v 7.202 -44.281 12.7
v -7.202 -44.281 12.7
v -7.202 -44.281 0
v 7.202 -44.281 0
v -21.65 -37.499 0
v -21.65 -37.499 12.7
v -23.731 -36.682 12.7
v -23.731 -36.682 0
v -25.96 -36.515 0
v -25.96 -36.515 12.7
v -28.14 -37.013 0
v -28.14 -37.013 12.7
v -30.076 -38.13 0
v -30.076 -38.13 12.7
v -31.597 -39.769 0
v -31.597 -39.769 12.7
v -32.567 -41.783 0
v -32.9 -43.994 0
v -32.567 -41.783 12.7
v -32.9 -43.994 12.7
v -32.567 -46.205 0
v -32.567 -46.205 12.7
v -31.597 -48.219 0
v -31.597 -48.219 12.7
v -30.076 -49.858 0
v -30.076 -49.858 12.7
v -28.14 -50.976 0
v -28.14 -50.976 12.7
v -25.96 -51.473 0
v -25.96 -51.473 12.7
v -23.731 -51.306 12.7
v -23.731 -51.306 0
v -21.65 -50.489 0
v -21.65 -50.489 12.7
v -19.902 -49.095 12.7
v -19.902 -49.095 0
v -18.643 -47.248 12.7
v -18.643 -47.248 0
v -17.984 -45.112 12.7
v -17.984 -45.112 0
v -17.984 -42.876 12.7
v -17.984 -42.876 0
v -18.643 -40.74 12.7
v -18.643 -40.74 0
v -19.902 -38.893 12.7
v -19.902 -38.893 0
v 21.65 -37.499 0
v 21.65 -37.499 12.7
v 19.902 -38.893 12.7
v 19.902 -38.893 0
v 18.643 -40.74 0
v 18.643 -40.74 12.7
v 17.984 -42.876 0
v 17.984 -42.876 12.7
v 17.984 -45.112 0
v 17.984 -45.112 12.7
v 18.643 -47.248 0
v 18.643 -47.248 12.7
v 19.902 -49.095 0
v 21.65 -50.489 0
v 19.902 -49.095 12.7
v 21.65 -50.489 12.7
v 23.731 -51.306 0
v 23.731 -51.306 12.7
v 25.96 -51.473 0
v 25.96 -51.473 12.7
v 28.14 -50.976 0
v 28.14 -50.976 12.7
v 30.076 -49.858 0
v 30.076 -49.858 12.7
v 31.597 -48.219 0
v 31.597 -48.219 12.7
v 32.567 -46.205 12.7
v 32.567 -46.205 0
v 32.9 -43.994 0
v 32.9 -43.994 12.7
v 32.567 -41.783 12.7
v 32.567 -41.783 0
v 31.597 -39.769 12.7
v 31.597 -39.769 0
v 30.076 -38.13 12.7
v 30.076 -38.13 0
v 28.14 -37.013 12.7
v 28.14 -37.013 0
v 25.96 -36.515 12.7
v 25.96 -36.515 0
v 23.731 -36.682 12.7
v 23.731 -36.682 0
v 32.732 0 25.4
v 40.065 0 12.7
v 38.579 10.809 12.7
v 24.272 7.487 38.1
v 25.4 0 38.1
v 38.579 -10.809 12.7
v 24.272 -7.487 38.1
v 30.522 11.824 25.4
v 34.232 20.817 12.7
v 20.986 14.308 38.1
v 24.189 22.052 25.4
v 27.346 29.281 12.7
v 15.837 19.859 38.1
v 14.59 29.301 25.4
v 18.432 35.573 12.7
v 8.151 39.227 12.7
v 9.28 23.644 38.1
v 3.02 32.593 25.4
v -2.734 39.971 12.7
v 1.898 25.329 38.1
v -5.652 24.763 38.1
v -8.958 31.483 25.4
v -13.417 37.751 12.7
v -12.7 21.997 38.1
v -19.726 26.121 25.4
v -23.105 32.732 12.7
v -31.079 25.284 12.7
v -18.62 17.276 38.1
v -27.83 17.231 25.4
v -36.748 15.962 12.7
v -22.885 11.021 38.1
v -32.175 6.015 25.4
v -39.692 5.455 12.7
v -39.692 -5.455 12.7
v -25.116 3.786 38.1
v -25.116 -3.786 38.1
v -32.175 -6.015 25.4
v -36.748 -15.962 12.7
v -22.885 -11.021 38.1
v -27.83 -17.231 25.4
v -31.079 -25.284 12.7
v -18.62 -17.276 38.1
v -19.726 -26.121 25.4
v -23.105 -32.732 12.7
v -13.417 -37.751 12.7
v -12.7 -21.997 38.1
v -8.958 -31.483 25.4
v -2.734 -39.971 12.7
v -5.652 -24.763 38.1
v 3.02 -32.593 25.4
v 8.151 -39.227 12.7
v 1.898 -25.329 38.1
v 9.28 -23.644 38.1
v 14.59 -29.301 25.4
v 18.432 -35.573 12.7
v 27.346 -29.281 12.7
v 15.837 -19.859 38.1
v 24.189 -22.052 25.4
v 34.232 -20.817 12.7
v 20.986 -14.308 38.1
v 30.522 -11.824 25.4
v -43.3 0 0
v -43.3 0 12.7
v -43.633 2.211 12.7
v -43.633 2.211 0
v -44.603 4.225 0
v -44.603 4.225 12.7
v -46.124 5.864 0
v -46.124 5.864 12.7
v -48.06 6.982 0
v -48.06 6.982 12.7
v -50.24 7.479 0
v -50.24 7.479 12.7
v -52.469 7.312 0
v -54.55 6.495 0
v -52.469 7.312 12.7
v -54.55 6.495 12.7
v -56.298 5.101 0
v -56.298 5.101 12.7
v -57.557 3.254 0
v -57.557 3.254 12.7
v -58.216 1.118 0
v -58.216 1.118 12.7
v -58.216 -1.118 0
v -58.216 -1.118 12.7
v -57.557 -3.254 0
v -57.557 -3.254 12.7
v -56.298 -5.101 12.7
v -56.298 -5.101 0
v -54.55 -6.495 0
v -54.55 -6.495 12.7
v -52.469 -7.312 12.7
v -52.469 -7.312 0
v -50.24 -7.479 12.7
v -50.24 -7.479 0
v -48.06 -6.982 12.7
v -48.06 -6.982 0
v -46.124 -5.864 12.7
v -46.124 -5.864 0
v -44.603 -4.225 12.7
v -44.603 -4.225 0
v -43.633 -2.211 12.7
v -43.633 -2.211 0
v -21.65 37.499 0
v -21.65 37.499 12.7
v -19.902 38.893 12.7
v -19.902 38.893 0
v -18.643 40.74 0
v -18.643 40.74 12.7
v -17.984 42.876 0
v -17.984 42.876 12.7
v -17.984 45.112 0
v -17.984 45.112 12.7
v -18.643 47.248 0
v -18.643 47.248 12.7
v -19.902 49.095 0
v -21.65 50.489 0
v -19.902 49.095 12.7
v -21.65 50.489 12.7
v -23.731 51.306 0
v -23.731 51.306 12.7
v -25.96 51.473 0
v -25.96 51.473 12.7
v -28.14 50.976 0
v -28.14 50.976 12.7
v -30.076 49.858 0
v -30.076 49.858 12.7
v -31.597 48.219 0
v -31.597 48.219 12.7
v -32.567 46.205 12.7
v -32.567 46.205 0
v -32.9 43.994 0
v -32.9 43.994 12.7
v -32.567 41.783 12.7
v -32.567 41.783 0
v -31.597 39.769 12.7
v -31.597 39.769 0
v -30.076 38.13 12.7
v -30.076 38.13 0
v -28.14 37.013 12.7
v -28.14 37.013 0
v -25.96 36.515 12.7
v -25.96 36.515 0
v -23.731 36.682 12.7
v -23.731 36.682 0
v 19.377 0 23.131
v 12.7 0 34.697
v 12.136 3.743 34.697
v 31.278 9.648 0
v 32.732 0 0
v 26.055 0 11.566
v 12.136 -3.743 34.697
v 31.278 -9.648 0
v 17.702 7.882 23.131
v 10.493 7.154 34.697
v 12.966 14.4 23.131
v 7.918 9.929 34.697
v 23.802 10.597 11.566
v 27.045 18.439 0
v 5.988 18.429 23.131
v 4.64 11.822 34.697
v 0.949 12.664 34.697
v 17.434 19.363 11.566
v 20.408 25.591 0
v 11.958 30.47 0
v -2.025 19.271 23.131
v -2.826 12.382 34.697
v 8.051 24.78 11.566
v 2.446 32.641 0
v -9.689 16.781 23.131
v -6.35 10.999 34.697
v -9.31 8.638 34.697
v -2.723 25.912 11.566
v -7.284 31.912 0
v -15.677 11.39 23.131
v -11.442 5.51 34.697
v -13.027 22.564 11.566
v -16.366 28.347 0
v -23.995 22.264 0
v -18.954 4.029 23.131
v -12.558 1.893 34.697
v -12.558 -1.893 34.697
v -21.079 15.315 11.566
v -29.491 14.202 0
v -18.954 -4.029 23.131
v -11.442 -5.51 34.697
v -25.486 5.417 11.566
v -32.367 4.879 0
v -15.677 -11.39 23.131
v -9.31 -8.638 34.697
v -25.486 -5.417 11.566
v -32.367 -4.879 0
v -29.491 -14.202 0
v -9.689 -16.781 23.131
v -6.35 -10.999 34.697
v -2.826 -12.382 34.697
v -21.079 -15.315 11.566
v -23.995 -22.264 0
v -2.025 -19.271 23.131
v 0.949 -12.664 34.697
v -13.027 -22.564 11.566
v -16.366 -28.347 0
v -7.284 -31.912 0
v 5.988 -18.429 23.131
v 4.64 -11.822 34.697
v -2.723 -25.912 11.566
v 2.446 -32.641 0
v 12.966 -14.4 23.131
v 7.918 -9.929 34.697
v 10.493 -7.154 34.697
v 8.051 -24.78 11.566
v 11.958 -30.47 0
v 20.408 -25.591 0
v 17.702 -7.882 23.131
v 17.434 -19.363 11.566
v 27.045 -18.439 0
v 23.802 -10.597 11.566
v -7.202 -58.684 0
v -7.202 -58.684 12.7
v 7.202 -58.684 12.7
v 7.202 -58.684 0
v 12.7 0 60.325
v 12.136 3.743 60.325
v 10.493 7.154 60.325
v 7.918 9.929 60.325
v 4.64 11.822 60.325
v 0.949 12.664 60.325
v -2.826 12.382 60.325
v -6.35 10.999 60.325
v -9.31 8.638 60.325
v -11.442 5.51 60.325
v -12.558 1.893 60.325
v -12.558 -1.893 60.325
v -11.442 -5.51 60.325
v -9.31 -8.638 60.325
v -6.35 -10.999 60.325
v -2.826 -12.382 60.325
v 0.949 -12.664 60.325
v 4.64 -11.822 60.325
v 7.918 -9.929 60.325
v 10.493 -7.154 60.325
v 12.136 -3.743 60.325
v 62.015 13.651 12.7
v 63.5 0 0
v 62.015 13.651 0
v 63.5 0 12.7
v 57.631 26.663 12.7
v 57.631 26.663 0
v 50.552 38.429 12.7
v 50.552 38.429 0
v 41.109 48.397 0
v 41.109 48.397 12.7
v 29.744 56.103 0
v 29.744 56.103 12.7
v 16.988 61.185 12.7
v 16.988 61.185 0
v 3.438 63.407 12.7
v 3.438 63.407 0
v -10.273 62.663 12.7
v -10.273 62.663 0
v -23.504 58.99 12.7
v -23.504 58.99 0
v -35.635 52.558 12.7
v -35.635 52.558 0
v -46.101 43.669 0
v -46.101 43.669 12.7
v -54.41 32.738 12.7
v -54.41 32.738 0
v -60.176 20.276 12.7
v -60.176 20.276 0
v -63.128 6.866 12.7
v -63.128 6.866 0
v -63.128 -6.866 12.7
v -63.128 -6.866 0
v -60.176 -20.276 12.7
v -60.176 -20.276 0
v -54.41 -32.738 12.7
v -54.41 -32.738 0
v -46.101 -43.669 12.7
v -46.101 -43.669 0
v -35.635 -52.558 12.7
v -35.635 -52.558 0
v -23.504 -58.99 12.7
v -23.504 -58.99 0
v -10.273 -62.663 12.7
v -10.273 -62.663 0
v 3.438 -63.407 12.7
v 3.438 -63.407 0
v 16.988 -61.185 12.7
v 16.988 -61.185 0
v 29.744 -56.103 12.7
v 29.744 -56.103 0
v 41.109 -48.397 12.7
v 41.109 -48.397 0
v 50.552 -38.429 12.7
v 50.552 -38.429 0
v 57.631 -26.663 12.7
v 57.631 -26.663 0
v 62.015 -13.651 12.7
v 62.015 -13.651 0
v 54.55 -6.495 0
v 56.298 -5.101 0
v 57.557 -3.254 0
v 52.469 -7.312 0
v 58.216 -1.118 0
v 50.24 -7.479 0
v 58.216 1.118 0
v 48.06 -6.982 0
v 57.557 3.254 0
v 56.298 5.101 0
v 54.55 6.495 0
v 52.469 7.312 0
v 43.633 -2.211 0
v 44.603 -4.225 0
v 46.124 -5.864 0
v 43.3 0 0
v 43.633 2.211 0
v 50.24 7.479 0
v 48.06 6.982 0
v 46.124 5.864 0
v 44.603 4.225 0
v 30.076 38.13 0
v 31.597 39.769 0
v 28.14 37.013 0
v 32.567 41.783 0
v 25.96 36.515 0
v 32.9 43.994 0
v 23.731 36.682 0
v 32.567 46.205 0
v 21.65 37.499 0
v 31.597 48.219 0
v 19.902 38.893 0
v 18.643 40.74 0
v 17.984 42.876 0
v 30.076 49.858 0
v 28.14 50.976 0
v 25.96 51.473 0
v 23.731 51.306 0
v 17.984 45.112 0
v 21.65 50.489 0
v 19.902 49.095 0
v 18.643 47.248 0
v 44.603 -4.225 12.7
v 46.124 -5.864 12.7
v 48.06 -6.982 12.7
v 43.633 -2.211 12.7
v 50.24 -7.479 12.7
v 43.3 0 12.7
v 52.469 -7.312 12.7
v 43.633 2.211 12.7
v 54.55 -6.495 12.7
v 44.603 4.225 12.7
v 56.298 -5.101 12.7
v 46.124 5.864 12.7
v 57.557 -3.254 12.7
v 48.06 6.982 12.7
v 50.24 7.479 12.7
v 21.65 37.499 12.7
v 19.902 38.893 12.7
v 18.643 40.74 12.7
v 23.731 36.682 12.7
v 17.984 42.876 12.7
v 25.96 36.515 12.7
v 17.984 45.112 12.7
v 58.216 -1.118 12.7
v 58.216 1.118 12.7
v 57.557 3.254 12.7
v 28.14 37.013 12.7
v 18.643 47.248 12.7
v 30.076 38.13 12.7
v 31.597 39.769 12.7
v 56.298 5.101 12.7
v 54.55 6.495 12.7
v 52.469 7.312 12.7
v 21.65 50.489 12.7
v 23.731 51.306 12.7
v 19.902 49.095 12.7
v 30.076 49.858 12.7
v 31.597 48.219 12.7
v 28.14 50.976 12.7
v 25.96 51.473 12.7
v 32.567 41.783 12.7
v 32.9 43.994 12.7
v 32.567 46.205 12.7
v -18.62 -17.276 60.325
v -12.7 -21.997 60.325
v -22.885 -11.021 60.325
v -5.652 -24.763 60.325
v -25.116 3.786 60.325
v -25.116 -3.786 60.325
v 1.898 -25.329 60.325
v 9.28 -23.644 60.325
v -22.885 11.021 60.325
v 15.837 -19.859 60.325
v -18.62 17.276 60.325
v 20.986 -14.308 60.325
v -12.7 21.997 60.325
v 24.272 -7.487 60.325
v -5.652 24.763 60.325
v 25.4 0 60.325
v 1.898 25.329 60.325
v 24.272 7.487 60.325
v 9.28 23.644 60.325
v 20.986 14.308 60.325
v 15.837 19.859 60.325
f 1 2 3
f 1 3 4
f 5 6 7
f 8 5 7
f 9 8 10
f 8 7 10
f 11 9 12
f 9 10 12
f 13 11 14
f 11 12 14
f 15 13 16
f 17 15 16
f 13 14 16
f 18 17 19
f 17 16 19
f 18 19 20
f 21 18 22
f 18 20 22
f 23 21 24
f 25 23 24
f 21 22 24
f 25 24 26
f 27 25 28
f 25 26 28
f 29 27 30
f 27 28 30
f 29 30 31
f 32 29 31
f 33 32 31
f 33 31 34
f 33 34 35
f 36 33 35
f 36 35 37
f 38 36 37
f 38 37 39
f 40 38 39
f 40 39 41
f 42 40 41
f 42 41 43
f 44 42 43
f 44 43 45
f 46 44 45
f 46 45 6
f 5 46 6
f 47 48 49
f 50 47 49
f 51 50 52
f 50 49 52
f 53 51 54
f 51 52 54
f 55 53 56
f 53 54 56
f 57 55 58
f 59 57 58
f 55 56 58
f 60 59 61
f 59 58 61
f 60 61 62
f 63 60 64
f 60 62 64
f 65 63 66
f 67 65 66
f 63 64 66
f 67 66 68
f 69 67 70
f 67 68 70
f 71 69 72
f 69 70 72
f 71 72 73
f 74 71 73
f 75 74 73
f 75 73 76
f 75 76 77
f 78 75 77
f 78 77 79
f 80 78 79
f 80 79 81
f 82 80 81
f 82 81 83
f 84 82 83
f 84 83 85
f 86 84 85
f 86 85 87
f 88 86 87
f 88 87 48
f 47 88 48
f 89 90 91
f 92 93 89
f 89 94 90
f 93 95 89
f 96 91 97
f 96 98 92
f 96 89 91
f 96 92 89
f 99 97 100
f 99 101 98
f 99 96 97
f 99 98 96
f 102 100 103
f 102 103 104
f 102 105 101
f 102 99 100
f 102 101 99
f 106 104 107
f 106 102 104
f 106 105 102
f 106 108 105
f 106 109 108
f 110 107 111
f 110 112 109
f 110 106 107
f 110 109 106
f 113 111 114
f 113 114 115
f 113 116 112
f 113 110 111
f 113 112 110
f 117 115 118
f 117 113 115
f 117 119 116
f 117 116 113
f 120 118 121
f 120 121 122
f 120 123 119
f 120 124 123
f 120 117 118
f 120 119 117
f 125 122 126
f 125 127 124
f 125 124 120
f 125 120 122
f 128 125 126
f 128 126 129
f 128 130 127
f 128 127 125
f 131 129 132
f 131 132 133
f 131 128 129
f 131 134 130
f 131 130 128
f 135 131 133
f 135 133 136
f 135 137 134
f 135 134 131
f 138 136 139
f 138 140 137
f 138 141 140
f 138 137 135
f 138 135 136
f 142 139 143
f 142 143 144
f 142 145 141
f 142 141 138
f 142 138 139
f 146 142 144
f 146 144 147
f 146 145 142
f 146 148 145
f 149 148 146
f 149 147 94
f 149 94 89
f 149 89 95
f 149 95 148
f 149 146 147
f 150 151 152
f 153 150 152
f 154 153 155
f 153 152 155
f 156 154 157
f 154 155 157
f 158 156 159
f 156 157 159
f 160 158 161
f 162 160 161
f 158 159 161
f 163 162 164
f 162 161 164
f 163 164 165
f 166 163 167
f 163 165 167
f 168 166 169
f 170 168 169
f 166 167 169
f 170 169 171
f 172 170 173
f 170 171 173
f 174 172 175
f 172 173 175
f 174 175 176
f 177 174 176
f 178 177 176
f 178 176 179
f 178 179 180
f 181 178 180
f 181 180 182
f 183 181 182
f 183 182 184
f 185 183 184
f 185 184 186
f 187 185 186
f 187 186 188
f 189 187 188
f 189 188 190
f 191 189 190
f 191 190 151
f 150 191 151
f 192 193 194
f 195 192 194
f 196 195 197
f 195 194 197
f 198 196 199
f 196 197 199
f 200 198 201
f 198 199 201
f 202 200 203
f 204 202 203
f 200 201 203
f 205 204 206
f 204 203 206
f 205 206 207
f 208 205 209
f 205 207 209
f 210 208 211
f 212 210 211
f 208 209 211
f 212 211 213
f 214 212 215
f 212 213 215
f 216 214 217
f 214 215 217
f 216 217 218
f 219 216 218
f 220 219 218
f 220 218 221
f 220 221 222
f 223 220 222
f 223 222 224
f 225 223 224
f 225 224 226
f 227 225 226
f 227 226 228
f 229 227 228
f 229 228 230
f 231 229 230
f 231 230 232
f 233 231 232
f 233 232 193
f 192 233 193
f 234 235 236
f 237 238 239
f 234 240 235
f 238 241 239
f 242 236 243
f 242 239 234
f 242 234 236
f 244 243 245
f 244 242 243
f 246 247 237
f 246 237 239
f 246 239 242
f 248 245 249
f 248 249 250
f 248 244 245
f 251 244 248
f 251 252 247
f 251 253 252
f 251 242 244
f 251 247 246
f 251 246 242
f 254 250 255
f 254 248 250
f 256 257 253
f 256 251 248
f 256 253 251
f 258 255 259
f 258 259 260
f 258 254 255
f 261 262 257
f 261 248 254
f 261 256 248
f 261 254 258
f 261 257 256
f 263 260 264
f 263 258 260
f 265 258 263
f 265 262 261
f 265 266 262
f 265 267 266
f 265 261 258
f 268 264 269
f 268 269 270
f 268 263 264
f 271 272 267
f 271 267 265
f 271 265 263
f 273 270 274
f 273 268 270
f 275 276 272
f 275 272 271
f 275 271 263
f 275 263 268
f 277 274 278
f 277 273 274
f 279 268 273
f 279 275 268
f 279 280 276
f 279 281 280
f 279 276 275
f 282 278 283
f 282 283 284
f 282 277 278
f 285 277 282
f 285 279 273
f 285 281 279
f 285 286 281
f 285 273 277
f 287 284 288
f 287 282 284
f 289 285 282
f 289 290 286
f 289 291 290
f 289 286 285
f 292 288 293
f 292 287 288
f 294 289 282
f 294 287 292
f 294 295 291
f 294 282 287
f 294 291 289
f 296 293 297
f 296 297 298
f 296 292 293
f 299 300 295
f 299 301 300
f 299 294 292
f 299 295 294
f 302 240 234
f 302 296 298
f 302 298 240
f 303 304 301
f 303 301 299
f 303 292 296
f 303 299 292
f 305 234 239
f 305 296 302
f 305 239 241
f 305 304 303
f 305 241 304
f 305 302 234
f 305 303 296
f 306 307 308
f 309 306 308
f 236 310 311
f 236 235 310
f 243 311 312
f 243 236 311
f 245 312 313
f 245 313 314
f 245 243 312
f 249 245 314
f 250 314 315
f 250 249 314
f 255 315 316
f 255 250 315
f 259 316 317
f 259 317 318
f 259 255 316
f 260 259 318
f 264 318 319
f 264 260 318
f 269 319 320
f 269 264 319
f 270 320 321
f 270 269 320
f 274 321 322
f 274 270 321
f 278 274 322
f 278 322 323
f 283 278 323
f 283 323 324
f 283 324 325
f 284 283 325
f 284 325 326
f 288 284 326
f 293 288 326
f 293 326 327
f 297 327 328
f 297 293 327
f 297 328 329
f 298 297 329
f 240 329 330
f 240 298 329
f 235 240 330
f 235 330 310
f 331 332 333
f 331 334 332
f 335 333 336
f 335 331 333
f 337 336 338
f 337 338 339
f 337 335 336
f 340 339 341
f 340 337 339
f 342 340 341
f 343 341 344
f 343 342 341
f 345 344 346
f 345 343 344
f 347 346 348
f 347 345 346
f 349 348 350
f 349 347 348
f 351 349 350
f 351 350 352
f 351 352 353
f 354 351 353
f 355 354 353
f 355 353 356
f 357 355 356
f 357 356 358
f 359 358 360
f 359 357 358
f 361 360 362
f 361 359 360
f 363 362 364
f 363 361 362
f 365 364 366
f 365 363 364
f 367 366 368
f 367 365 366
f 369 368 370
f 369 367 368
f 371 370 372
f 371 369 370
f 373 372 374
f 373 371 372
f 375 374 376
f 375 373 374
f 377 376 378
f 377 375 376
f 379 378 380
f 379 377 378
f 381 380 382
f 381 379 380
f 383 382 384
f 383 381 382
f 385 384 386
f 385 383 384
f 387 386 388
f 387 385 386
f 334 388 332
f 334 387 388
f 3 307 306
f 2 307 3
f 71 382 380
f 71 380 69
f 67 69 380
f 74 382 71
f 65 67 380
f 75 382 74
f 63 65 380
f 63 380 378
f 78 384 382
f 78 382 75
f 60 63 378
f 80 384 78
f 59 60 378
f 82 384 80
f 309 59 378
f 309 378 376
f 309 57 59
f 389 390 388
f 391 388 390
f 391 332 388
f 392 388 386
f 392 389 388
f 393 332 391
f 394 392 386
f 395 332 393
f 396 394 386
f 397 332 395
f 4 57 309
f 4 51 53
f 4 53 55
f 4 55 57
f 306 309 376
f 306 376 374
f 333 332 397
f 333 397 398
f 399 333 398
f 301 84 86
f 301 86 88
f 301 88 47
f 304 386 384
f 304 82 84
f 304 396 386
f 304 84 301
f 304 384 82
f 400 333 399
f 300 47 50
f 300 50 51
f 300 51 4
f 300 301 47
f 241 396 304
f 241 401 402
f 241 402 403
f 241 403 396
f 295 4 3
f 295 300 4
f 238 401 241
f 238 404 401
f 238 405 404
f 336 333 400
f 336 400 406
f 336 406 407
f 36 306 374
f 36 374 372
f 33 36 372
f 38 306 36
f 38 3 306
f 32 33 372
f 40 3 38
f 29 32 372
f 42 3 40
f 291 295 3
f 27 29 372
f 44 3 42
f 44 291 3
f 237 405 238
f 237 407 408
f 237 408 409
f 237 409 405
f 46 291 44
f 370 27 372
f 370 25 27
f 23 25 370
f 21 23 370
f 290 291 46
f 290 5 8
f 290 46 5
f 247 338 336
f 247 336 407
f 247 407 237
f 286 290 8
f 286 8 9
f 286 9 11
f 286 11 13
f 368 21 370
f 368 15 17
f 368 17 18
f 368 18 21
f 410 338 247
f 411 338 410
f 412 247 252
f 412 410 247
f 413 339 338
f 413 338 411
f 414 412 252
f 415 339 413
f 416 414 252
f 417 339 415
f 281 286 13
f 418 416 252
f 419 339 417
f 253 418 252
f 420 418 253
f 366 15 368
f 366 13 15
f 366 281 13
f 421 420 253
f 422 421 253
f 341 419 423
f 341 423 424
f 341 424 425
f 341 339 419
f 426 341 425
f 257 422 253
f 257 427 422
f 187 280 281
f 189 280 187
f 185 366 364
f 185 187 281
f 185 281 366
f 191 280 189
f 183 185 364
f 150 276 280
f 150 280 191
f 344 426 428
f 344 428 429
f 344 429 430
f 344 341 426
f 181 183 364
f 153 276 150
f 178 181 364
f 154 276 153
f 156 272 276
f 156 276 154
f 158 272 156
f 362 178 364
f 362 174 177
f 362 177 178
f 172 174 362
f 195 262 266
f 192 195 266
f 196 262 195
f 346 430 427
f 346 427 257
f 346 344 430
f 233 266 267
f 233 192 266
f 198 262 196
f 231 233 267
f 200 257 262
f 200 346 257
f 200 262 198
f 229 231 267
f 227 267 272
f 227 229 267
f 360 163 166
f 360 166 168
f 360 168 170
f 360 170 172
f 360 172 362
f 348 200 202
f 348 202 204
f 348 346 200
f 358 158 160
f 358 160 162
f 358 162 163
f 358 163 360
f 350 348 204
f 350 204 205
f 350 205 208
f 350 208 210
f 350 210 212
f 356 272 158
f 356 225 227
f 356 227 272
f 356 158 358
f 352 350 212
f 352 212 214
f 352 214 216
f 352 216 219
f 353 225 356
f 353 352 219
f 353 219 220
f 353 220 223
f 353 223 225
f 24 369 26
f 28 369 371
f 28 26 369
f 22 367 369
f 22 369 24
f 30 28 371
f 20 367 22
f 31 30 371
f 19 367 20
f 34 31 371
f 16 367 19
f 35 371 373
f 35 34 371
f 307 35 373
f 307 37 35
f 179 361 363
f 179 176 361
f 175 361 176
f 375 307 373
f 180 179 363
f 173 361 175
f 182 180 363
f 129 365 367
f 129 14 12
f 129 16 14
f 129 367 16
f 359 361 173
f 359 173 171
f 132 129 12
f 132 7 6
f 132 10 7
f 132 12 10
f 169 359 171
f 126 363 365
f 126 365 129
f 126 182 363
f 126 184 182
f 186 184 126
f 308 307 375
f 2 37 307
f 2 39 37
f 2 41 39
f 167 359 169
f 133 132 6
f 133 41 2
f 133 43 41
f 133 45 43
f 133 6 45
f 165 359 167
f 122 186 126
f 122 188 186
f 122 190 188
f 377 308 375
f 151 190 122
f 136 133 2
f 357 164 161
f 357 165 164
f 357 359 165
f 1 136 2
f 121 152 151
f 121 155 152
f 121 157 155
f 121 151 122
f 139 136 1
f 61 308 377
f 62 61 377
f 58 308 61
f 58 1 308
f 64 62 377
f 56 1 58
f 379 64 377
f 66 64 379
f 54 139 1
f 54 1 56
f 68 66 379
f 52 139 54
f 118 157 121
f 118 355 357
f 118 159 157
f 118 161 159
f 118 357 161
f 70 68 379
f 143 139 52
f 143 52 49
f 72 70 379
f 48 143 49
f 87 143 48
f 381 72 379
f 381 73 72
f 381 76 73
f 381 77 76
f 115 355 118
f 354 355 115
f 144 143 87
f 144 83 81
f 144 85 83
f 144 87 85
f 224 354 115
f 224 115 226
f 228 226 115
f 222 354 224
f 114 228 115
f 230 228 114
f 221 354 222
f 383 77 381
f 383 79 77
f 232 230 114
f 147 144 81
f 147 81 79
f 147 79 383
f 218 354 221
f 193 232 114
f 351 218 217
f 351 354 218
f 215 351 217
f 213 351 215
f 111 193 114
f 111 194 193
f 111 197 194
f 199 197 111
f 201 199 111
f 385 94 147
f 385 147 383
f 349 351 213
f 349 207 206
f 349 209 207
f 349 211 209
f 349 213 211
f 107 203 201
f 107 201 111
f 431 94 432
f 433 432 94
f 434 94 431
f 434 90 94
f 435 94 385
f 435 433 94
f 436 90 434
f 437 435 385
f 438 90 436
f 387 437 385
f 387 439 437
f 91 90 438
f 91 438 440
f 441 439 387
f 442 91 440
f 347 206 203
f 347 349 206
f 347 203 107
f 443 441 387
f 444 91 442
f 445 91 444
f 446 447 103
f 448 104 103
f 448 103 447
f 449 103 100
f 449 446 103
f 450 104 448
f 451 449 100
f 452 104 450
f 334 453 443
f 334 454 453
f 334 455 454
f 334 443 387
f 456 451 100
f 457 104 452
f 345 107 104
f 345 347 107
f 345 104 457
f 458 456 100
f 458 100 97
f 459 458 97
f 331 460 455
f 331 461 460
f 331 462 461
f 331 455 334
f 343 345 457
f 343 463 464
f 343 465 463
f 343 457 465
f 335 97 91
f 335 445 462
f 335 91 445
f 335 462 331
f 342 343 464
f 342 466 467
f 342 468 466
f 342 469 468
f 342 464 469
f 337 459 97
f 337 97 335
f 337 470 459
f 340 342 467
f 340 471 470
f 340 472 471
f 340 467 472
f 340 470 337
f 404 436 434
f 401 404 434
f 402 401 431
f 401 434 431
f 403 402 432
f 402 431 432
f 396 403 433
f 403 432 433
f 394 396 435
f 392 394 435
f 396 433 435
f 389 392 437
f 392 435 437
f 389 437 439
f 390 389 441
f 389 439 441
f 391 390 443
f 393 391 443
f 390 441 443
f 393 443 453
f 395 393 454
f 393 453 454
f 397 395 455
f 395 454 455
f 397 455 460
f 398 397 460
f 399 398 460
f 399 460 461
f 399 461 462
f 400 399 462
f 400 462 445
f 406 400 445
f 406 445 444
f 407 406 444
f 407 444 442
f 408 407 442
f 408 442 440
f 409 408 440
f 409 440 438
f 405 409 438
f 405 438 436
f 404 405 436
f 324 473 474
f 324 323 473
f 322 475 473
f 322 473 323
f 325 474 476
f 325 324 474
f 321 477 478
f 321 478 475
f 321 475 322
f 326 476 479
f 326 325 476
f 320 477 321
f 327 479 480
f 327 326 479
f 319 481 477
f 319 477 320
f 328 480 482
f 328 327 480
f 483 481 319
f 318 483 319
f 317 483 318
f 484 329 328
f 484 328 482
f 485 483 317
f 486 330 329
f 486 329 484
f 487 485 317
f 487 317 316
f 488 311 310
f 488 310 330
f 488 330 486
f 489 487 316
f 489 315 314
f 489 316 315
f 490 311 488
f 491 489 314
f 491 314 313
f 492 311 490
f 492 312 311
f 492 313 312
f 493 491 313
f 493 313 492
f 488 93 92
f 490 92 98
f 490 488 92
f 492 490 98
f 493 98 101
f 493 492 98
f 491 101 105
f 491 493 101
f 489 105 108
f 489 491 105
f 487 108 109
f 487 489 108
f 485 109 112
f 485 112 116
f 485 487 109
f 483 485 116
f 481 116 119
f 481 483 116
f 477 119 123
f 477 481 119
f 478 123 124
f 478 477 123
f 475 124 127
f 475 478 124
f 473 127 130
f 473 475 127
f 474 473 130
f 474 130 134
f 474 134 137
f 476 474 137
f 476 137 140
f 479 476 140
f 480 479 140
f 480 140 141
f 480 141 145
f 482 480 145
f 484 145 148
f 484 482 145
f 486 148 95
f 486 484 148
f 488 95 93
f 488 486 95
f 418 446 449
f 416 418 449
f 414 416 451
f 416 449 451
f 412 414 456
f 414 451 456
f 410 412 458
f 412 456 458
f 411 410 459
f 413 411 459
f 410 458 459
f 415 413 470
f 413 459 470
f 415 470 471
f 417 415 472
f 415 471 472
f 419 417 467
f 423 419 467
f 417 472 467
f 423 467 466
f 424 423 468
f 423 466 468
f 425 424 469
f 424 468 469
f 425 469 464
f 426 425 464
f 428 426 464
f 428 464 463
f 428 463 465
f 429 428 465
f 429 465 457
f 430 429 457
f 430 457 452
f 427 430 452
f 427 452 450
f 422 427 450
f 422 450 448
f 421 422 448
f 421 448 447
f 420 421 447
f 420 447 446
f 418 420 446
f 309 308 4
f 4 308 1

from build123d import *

# Parameters (mm, degrees)
F2_R            = 7.5
F3_DEPTH        = 12.701
F3_COPIES_COUNT = 6
F4_W            = 14.403924346
F4_H            = 14.403924346
F5_DEPTH        = 12.701


# Not quite as in the source:
# - a pattern or mirror of a feature is missing from the dataset's text; its kind, count and spacing are read off the source's solid


with BuildPart() as f1:
    # F0 (on Front) → F1 (revolve)
    with BuildSketch(Plane.XZ):
        Polygon((25.4, 60.325), (12.7, 60.325), (12.7, 34.6970452561), (32.7323484187, 0), (63.5, 0), (63.5, 12.7), (40.0646968374, 12.7), (25.4, 38.1), align=None)
    revolve(axis=Axis((0, 0, 18.9653343184), (0, 0, 1)))

    # F2 (on face) → F3 (cut, through all)
    with BuildSketch(Plane.XY.offset(12.7)):
        with Locations((-50.8, 0)):
            Circle(F2_R)
    f3 = extrude(amount=-F3_DEPTH, mode=Mode.SUBTRACT)

    # F3_copies: F3 ×6 about axis
    f3_copies_axis = Axis((0, 0, 0), (0, 0, 1))
    for i in range(1, F3_COPIES_COUNT):
        add(f3.rotate(f3_copies_axis, i * 360 / F3_COPIES_COUNT), mode=Mode.SUBTRACT)

    # F4 (on face) → F5 (cut, through all)
    with BuildSketch(Plane.XY.offset(12.7)):
        with Locations((0, -51.4825247228)):
            Rectangle(F4_W, F4_H)
    extrude(amount=-F5_DEPTH, mode=Mode.SUBTRACT)


solid = f1.part
